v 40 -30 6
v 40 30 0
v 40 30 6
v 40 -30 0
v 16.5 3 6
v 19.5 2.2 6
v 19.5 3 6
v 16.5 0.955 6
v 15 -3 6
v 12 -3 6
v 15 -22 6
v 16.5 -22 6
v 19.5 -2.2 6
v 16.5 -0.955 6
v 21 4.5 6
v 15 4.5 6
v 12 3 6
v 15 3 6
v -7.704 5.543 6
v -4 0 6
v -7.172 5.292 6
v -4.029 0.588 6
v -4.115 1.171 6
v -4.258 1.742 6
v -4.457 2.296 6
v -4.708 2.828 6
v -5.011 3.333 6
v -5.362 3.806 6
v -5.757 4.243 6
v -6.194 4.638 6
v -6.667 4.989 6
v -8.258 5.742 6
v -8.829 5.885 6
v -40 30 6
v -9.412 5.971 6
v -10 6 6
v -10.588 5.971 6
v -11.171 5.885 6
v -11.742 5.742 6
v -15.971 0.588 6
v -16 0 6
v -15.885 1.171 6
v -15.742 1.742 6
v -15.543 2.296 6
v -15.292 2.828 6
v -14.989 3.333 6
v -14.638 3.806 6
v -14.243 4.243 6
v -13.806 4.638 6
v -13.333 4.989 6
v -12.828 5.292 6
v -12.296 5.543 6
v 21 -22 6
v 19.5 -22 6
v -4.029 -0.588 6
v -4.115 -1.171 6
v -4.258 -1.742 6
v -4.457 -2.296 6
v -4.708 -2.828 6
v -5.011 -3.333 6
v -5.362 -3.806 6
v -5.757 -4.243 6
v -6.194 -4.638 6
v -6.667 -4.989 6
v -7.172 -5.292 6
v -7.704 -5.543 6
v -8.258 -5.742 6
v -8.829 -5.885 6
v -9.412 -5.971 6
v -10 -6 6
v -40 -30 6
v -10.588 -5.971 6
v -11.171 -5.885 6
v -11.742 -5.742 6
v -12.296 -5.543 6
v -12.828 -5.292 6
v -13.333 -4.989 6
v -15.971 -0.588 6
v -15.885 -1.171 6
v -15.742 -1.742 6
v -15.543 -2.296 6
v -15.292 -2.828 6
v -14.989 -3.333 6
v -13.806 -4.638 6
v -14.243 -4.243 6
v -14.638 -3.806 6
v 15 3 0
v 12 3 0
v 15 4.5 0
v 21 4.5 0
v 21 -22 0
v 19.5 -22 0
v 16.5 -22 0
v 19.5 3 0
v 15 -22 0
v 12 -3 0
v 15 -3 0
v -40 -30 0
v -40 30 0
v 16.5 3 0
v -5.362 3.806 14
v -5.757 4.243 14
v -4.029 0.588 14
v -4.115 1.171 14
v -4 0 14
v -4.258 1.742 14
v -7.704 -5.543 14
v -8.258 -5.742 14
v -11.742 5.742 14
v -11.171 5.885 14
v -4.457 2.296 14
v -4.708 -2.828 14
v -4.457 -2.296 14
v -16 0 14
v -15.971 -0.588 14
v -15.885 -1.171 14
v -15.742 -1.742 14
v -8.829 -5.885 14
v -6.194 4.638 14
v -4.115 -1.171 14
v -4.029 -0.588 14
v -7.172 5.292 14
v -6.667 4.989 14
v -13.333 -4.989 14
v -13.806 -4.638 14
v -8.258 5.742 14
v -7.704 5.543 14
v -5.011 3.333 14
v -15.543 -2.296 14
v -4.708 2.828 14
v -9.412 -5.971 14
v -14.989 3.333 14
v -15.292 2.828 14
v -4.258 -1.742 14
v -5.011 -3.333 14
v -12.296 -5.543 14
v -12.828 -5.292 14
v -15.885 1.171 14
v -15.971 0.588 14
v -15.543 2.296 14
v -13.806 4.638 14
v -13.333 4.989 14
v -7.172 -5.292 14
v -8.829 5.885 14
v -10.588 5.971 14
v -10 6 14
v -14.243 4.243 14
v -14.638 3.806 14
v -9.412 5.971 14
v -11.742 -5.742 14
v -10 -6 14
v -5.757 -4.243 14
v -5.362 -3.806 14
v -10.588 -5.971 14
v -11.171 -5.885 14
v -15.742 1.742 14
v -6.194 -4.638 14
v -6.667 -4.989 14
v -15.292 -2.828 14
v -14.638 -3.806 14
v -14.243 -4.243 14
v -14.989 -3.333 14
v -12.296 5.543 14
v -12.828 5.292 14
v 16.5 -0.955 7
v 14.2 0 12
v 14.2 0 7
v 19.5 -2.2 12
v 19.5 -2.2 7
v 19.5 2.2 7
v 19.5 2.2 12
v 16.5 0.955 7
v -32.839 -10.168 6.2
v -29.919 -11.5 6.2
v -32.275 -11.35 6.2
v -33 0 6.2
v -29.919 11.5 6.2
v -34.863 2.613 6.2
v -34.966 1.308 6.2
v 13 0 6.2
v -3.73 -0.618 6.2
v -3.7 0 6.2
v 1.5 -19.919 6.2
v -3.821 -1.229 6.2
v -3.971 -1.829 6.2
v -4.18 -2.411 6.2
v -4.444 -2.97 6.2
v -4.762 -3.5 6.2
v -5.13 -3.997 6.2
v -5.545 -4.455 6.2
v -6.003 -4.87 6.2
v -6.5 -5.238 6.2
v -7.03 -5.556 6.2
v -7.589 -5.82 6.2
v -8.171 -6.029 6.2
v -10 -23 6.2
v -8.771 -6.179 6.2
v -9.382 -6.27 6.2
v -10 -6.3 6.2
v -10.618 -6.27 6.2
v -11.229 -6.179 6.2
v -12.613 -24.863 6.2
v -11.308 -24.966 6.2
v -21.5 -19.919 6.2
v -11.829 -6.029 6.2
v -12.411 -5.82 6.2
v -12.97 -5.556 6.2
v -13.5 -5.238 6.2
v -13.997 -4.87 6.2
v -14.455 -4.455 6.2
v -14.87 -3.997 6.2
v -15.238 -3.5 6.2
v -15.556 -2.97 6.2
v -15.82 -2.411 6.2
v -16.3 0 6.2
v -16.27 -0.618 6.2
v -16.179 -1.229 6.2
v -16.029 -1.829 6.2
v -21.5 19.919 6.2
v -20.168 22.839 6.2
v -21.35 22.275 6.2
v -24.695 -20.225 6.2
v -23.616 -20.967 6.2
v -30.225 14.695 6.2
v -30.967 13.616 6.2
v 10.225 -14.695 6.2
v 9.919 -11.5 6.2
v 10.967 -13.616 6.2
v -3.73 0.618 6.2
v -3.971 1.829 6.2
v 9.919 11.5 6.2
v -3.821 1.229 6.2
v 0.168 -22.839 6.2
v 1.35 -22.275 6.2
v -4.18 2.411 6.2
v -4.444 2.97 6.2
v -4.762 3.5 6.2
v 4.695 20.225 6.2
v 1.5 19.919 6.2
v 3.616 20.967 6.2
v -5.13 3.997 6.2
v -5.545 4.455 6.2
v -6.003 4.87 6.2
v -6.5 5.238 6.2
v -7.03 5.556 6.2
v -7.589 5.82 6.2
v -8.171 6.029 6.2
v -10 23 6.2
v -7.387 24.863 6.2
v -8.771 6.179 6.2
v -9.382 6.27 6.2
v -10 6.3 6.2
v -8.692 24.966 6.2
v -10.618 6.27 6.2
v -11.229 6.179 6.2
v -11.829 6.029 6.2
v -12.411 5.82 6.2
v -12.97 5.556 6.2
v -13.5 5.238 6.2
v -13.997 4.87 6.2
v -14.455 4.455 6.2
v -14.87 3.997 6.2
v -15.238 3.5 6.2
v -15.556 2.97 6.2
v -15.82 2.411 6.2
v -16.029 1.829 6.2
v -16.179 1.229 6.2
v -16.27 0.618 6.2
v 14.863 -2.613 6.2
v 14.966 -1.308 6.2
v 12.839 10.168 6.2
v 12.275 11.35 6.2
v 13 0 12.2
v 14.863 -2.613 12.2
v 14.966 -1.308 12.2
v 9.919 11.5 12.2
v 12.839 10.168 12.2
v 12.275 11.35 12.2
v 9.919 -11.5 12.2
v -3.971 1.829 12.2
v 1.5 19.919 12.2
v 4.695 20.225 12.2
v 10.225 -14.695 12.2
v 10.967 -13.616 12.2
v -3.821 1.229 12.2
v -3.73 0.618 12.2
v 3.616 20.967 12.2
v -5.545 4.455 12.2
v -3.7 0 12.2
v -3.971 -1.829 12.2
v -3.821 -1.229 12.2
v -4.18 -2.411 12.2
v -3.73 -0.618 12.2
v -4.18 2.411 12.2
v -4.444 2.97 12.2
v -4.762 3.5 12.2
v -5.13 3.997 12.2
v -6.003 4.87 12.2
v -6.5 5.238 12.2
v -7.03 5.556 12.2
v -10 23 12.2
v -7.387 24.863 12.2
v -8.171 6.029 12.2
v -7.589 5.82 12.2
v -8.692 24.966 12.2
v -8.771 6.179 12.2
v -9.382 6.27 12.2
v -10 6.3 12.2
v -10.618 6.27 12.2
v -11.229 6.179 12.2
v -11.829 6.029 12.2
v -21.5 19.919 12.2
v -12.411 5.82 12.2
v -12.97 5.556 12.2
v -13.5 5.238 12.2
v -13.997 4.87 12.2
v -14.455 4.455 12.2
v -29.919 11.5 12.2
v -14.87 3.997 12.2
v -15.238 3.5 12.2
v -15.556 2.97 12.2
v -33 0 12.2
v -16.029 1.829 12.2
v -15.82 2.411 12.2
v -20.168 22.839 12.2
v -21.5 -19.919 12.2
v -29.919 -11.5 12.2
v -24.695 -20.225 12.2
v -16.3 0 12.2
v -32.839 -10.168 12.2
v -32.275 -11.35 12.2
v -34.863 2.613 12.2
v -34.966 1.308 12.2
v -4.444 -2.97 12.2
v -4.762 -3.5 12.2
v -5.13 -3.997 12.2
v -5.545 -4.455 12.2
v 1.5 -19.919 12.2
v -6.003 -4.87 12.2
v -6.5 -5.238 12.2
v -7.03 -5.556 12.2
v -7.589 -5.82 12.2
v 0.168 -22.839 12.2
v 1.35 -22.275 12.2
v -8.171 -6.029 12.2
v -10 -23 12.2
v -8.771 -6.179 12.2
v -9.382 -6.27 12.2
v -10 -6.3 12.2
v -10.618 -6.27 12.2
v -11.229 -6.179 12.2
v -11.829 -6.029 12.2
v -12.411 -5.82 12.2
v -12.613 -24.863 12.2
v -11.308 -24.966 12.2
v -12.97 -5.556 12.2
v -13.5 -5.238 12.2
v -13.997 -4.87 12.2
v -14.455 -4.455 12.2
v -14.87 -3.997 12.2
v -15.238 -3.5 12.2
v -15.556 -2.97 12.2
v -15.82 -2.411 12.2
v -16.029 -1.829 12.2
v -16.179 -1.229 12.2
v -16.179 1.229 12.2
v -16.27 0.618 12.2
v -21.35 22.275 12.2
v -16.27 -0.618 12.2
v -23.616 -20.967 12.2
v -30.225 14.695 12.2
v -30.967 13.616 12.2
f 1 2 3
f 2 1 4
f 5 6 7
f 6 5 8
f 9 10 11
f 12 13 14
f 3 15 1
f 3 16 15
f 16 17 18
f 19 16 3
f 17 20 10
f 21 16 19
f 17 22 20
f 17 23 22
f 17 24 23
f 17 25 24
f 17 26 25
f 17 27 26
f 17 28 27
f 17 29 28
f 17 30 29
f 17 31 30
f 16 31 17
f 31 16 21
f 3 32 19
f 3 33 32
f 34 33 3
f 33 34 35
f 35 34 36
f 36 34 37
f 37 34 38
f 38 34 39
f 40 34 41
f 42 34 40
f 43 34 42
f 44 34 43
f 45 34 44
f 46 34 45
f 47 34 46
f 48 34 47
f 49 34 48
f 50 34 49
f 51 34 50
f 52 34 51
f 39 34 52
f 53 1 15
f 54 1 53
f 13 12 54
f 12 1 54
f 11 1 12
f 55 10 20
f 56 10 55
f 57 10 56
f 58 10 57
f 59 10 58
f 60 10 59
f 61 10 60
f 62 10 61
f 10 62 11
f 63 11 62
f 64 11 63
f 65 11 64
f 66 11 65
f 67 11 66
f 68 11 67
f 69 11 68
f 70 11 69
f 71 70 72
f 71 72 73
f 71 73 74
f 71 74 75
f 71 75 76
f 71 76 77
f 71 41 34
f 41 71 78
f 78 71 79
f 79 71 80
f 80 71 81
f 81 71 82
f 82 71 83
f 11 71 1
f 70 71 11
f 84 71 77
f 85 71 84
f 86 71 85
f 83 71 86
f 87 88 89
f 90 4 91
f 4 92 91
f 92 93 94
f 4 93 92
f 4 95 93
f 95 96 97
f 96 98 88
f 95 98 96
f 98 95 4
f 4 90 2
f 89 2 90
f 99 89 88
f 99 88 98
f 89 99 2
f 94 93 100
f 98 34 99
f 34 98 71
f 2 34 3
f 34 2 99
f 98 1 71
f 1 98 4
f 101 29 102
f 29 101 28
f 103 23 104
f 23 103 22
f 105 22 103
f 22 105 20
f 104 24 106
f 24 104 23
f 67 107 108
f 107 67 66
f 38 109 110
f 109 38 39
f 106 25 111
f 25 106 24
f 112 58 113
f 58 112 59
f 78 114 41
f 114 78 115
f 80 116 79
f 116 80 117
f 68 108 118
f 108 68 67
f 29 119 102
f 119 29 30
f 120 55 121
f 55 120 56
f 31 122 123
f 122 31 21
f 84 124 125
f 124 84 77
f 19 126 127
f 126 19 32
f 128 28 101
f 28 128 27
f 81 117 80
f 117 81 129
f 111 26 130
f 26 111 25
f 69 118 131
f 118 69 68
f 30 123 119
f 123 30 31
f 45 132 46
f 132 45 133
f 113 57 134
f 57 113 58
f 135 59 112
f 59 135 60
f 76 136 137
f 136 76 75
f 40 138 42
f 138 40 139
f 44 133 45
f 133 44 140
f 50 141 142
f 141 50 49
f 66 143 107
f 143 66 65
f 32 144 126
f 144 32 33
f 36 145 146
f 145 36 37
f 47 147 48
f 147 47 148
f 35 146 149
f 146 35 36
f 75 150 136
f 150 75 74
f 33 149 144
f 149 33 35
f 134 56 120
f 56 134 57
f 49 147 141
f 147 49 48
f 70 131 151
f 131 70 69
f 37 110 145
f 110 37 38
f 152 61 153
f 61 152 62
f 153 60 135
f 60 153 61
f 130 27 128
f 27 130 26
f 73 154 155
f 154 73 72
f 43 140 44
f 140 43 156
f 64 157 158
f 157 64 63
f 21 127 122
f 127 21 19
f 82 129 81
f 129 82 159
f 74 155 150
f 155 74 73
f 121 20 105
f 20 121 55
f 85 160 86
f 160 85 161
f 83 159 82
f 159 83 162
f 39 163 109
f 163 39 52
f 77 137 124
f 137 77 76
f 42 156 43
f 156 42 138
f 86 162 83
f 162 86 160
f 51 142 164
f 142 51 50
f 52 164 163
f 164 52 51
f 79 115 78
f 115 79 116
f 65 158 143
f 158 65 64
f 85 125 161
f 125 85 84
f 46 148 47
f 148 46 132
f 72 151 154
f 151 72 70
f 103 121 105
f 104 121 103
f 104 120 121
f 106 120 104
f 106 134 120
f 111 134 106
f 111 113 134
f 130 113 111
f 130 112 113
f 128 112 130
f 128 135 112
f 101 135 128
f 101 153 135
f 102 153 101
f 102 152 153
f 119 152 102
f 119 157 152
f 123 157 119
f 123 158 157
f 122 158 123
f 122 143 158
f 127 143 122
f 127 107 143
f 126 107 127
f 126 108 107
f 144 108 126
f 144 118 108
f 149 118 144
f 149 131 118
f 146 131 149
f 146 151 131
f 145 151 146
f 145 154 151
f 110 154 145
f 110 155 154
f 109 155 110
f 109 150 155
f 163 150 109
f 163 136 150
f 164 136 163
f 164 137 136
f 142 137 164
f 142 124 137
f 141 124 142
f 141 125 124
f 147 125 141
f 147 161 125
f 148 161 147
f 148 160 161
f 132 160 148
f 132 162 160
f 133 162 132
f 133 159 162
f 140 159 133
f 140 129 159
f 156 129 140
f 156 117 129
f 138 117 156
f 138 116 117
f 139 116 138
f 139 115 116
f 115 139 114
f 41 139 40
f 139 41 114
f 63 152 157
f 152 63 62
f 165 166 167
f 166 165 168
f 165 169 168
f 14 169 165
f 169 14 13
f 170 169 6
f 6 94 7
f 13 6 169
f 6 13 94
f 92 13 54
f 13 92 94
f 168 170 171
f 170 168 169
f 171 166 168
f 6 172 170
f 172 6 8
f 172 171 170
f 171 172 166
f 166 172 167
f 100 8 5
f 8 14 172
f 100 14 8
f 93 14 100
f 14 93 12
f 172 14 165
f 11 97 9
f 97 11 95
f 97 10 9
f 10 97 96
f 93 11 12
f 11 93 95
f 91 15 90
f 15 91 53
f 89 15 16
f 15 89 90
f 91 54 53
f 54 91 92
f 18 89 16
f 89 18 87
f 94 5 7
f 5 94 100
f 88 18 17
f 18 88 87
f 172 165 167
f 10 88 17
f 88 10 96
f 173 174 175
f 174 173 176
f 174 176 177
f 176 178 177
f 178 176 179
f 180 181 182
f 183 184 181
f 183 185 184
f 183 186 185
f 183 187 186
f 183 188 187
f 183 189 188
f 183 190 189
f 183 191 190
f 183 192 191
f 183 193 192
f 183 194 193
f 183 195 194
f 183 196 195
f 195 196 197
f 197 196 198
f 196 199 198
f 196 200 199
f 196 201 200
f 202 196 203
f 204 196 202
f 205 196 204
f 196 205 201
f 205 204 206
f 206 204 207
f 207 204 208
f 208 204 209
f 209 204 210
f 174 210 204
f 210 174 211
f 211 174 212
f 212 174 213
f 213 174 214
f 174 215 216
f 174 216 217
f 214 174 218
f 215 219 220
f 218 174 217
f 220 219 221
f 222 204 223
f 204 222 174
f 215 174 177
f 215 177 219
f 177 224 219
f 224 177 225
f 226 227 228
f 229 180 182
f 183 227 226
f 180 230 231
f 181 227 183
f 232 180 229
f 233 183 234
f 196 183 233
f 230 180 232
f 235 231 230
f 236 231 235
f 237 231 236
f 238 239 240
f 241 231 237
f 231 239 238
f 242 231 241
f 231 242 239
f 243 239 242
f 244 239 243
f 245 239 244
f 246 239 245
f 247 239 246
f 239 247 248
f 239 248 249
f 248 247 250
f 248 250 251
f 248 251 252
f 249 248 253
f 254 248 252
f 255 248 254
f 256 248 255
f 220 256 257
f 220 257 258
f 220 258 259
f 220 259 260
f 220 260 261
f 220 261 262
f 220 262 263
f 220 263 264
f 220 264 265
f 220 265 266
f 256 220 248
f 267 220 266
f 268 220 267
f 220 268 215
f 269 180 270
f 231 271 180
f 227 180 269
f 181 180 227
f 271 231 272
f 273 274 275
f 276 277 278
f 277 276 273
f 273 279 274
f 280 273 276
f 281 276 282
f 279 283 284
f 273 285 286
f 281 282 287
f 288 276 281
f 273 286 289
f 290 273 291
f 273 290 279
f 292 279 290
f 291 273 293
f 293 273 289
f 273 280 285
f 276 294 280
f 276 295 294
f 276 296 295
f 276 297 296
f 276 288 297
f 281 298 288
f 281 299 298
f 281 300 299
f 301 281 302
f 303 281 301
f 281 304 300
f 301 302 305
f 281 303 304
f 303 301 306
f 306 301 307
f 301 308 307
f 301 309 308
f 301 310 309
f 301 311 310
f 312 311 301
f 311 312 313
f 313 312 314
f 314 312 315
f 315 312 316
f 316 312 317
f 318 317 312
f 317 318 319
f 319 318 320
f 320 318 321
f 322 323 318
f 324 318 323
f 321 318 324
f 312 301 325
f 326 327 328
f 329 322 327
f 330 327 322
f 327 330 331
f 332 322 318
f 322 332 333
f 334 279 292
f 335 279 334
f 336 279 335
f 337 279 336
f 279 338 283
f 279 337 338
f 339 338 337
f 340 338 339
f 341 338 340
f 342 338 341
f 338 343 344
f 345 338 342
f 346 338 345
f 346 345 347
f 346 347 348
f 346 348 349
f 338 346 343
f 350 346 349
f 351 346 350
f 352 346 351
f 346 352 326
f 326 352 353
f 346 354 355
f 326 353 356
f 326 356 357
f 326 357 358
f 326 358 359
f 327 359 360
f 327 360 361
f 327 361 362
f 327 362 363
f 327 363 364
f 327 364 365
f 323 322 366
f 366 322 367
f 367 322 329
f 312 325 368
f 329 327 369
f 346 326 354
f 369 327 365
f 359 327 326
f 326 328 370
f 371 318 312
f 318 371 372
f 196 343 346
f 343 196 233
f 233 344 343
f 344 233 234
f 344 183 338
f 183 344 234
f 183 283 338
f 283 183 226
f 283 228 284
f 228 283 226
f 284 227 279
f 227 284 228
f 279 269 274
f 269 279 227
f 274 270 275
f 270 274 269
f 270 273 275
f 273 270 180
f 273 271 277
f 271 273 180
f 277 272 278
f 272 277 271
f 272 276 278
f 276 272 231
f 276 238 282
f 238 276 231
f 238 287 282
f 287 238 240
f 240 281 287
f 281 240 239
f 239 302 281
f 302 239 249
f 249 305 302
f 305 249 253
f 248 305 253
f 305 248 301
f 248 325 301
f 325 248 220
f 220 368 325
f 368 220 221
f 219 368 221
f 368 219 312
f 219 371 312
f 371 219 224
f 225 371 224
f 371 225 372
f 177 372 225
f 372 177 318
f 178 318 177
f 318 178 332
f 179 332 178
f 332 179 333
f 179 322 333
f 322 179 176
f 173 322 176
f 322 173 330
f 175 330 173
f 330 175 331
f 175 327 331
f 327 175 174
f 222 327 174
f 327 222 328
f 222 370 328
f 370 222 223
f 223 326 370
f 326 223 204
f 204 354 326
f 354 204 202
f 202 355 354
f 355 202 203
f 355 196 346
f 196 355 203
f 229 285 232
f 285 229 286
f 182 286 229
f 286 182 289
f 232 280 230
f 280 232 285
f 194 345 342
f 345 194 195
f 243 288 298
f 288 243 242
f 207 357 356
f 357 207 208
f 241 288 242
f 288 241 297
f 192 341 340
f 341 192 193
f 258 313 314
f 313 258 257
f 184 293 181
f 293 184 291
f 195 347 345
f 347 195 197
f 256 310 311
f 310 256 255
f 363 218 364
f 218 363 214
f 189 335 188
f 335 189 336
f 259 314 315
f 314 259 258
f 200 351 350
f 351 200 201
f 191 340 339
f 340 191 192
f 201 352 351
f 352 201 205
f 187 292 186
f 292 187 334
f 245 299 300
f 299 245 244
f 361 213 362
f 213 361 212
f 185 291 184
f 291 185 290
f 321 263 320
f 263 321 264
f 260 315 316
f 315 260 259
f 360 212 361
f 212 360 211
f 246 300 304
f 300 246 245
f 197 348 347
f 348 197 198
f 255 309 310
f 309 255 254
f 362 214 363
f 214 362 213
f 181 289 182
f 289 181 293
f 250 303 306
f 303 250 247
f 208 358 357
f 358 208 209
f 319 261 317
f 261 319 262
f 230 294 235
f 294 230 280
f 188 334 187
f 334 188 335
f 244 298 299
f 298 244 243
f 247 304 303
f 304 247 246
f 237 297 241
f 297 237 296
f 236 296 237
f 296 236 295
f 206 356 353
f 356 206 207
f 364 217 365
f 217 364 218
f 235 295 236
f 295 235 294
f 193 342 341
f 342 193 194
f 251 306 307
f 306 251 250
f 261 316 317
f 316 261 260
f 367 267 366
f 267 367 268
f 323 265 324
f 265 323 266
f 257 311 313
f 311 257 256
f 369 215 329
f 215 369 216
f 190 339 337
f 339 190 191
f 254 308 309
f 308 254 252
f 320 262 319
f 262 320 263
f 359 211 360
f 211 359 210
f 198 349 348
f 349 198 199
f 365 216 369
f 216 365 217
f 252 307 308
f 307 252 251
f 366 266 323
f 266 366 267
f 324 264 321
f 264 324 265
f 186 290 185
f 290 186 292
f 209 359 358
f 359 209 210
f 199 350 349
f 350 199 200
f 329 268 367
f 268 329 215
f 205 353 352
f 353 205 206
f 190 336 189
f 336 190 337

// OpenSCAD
/* Ratchet wheel with spring pawl - desk demo, PLA, 0.4 mm nozzle, no supports.
   Wheel (~50 mm, 12 teeth) turns on a post; the pawl is part of the base on a
   flexible arm cut from the plate. Free way is clockwise seen from above
   (negative rotation about +Z). */
part = "assembly"; // [wheel:Wheel, base:Base, assembly:Assembly]

cadverify_only = "";
module instance(name, part, unit = 1) {
    echo(cadverify_instance = [name, part, unit]);
    if (cadverify_only == "" || cadverify_only == name) children();
}

// ---------- parameters (mm) ----------
Rtip = 25;          // wheel outer radius (50 mm across)
Rroot = 23;         // wheel root radius (tooth height 2 mm)
wheel_t = 6;        // wheel thickness
hole_D = 12.6;      // wheel centre hole diameter
post_D = 12;        // base post diameter (0.6 mm play on diameter)
post_h = 8;         // post height above base top
base_t = 6;         // base plate thickness
base_x = 80;
base_y = 60;
wheel_cx = -10;     // wheel centre in base/assembly XY
wheel_cy = 0;
wheel_gap = 0.2;    // wheel bottom above base top
wheel_lift_z = base_t + wheel_gap;   // 6.2 wheel bottom in assembly
post_top_z = base_t + post_h;        // 14
pawl_tip_x = 14.2;  // pawl tip: 0.8 inside tip circle, 1.2 off root
beam_x0 = 16.5; beam_x1 = 19.5;      // flexible arm: 3 mm wide ...
beam_y0 = -22; beam_y1 = 3;          // ... 25 mm long, fixed south, free north
slot_w = 1.5;       // slot width (clears a 0.4 mm nozzle)
pawl_h = 6;         // pawl height above plate (meets wheel band 6.2..12.2)
rest_angle = 0;     // gullet bottom centred on pawl tip

// tooth k: root at 30k, shallow rise to tip at 30k+24, tip land to +27,
// steep drop to root at +30. Shallow face cams the pawl out (free way),
// steep face pushes along the arm (locks reverse).
function wheel_pts() = [
    for(k=[0:11]) for(j=[0:2])
        j==0 ? [Rroot*cos(k*30), Rroot*sin(k*30)]
      : j==1 ? [Rtip*cos(k*30+24), Rtip*sin(k*30+24)]
             : [Rtip*cos(k*30+27), Rtip*sin(k*30+27)]
];

module wheel() {
    difference() {
        linear_extrude(height=wheel_t, convexity=4)
            polygon(points=wheel_pts());
        translate([0,0,-1]) cylinder(d=hole_D, h=wheel_t+2, $fn=64);
    }
}

module base() {
    difference() {
        union() {
            // plate
            translate([-base_x/2, -base_y/2, 0]) cube([base_x, base_y, base_t]);
            // post the wheel turns on
            translate([wheel_cx, wheel_cy, base_t]) cylinder(d=post_D, h=post_h, $fn=64);
            // pawl wedge: tip near the wheel, root fused onto the free end of the arm
            translate([0,0,base_t]) linear_extrude(height=pawl_h, convexity=2)
                polygon(points=[[pawl_tip_x, 0],[beam_x1, 2.2],[beam_x1, -2.2]]);
        }
        // U-slot freeing the arm (one connected through opening) + window under pawl tip
        translate([beam_x0-slot_w, beam_y0, -1]) cube([slot_w, 19, base_t+2]); // west x15..16.5 y-22..-3
        translate([beam_x1, beam_y0, -1]) cube([slot_w, 26.5, base_t+2]);      // east x19.5..21 y-22..4.5
        translate([beam_x0-slot_w, beam_y1, -1]) cube([6, slot_w, base_t+2]);  // north x15..21 y3..4.5
        translate([12, -3, -1]) cube([4.5, 6, base_t+2]);                       // window x12..16.5 y-3..3
    }
}

module assembly() {
    instance("base_inst", "base", 1) base();
    instance("wheel_inst", "wheel", 1)
        translate([wheel_cx, wheel_cy, wheel_lift_z]) rotate([0,0,rest_angle]) wheel();
}

// ---------- specs (computed from parameters) ----------
wheel_spec = [
    ["bounds", [[-Rtip, -Rtip, 0], [Rtip, Rtip, wheel_t]]],
    ["bodies", 1],
    ["through_holes", 1],
    ["support_faces", [["bed", "-z", 800]]],
    ["overhangs_allowed", []],
    ["copies", 1],
    ["details", [
        ["axle_hole", "hole", [0, 0, wheel_t+4], [0, 0, -1], [[0, hole_D], [3, hole_D]]],
        ["rim_thick", "thickness", [15, 0, wheel_t+4], [0, 0, -1], wheel_t],
        ["tooth0", "material", [[22.05, 7.71, 0], [23.05, 8.71, wheel_t]], 0.5],
        ["tooth4", "material", [[-18.89, 14.93, 0], [-17.89, 15.93, wheel_t]], 0.5],
        ["tooth8", "material", [[-4.67, -24.14, 0], [-3.67, -23.14, wheel_t]], 0.5]
    ]]
];

base_spec = [
    ["bounds", [[-base_x/2, -base_y/2, 0], [base_x/2, base_y/2, post_top_z]]],
    ["bodies", 1],
    ["through_holes", 1],
    ["support_faces", [["bed", "-z", 2000]]],
    ["overhangs_allowed", [["pawl bridges slot", [[14, -1.5, 5.9], [17, 1.5, 6.1]]]]],
    ["copies", 1],
    ["details", [
        ["plate_thick", "thickness", [0, -28, base_t+4], [0, 0, -1], base_t],
        ["post_dia", "thickness", [wheel_cx-10, wheel_cy, base_t+post_h-1], [1, 0, 0], post_D],
        ["post_core", "material", [[wheel_cx-2, -2, 8], [wheel_cx+2, 2, 13]], 0.8],
        ["arm_width", "thickness", [beam_x0-0.75, -16, 3], [1, 0, 0], beam_x1-beam_x0],
        ["arm_full", "material", [[17, -20, 0], [19, -12, base_t]], 0.8],
        ["slot_gap", "void", [[beam_x0-slot_w, -20, 0], [beam_x0, -10, base_t]], 0.8],
        ["window_void", "void", [[12.5, -2.5, 0], [16, 2.5, base_t]], 0.8],
        ["pawl_tip", "material", [[14.9, -0.2, 8], [15.7, 0.2, 11]], 0.5],
        ["pawl_height", "thickness", [14.5, 0, base_t+pawl_h+3], [0, 0, -1], pawl_h]
    ]]
];

assembly_spec = [
    ["bounds", [[-base_x/2, -base_y/2, 0], [base_x/2, base_y/2, post_top_z]]],
    ["support_faces", [["desk", "-z", 2000]]],
    ["allowed_interferences", []],
    ["motions", [
        ["spin_free", ["wheel_inst"], "rotate", [wheel_cx, wheel_cy, wheel_lift_z], [0, 0, 1], [0, -360],
            ["flex", [["wheel_inst", "base_inst", 0.9, "pawl clicks over teeth"]]]]
    ]],
    ["assembly_order", [
        [["base_inst"], [0, 0, 0]],
        [["wheel_inst"], [0, 0, -1]]
    ]]
];

if (part == "wheel") {
    echo(cadverify_spec = wheel_spec);
    wheel();
} else if (part == "base") {
    echo(cadverify_spec = base_spec);
    base();
} else {
    echo(cadverify_spec = assembly_spec);
    assembly();
}
